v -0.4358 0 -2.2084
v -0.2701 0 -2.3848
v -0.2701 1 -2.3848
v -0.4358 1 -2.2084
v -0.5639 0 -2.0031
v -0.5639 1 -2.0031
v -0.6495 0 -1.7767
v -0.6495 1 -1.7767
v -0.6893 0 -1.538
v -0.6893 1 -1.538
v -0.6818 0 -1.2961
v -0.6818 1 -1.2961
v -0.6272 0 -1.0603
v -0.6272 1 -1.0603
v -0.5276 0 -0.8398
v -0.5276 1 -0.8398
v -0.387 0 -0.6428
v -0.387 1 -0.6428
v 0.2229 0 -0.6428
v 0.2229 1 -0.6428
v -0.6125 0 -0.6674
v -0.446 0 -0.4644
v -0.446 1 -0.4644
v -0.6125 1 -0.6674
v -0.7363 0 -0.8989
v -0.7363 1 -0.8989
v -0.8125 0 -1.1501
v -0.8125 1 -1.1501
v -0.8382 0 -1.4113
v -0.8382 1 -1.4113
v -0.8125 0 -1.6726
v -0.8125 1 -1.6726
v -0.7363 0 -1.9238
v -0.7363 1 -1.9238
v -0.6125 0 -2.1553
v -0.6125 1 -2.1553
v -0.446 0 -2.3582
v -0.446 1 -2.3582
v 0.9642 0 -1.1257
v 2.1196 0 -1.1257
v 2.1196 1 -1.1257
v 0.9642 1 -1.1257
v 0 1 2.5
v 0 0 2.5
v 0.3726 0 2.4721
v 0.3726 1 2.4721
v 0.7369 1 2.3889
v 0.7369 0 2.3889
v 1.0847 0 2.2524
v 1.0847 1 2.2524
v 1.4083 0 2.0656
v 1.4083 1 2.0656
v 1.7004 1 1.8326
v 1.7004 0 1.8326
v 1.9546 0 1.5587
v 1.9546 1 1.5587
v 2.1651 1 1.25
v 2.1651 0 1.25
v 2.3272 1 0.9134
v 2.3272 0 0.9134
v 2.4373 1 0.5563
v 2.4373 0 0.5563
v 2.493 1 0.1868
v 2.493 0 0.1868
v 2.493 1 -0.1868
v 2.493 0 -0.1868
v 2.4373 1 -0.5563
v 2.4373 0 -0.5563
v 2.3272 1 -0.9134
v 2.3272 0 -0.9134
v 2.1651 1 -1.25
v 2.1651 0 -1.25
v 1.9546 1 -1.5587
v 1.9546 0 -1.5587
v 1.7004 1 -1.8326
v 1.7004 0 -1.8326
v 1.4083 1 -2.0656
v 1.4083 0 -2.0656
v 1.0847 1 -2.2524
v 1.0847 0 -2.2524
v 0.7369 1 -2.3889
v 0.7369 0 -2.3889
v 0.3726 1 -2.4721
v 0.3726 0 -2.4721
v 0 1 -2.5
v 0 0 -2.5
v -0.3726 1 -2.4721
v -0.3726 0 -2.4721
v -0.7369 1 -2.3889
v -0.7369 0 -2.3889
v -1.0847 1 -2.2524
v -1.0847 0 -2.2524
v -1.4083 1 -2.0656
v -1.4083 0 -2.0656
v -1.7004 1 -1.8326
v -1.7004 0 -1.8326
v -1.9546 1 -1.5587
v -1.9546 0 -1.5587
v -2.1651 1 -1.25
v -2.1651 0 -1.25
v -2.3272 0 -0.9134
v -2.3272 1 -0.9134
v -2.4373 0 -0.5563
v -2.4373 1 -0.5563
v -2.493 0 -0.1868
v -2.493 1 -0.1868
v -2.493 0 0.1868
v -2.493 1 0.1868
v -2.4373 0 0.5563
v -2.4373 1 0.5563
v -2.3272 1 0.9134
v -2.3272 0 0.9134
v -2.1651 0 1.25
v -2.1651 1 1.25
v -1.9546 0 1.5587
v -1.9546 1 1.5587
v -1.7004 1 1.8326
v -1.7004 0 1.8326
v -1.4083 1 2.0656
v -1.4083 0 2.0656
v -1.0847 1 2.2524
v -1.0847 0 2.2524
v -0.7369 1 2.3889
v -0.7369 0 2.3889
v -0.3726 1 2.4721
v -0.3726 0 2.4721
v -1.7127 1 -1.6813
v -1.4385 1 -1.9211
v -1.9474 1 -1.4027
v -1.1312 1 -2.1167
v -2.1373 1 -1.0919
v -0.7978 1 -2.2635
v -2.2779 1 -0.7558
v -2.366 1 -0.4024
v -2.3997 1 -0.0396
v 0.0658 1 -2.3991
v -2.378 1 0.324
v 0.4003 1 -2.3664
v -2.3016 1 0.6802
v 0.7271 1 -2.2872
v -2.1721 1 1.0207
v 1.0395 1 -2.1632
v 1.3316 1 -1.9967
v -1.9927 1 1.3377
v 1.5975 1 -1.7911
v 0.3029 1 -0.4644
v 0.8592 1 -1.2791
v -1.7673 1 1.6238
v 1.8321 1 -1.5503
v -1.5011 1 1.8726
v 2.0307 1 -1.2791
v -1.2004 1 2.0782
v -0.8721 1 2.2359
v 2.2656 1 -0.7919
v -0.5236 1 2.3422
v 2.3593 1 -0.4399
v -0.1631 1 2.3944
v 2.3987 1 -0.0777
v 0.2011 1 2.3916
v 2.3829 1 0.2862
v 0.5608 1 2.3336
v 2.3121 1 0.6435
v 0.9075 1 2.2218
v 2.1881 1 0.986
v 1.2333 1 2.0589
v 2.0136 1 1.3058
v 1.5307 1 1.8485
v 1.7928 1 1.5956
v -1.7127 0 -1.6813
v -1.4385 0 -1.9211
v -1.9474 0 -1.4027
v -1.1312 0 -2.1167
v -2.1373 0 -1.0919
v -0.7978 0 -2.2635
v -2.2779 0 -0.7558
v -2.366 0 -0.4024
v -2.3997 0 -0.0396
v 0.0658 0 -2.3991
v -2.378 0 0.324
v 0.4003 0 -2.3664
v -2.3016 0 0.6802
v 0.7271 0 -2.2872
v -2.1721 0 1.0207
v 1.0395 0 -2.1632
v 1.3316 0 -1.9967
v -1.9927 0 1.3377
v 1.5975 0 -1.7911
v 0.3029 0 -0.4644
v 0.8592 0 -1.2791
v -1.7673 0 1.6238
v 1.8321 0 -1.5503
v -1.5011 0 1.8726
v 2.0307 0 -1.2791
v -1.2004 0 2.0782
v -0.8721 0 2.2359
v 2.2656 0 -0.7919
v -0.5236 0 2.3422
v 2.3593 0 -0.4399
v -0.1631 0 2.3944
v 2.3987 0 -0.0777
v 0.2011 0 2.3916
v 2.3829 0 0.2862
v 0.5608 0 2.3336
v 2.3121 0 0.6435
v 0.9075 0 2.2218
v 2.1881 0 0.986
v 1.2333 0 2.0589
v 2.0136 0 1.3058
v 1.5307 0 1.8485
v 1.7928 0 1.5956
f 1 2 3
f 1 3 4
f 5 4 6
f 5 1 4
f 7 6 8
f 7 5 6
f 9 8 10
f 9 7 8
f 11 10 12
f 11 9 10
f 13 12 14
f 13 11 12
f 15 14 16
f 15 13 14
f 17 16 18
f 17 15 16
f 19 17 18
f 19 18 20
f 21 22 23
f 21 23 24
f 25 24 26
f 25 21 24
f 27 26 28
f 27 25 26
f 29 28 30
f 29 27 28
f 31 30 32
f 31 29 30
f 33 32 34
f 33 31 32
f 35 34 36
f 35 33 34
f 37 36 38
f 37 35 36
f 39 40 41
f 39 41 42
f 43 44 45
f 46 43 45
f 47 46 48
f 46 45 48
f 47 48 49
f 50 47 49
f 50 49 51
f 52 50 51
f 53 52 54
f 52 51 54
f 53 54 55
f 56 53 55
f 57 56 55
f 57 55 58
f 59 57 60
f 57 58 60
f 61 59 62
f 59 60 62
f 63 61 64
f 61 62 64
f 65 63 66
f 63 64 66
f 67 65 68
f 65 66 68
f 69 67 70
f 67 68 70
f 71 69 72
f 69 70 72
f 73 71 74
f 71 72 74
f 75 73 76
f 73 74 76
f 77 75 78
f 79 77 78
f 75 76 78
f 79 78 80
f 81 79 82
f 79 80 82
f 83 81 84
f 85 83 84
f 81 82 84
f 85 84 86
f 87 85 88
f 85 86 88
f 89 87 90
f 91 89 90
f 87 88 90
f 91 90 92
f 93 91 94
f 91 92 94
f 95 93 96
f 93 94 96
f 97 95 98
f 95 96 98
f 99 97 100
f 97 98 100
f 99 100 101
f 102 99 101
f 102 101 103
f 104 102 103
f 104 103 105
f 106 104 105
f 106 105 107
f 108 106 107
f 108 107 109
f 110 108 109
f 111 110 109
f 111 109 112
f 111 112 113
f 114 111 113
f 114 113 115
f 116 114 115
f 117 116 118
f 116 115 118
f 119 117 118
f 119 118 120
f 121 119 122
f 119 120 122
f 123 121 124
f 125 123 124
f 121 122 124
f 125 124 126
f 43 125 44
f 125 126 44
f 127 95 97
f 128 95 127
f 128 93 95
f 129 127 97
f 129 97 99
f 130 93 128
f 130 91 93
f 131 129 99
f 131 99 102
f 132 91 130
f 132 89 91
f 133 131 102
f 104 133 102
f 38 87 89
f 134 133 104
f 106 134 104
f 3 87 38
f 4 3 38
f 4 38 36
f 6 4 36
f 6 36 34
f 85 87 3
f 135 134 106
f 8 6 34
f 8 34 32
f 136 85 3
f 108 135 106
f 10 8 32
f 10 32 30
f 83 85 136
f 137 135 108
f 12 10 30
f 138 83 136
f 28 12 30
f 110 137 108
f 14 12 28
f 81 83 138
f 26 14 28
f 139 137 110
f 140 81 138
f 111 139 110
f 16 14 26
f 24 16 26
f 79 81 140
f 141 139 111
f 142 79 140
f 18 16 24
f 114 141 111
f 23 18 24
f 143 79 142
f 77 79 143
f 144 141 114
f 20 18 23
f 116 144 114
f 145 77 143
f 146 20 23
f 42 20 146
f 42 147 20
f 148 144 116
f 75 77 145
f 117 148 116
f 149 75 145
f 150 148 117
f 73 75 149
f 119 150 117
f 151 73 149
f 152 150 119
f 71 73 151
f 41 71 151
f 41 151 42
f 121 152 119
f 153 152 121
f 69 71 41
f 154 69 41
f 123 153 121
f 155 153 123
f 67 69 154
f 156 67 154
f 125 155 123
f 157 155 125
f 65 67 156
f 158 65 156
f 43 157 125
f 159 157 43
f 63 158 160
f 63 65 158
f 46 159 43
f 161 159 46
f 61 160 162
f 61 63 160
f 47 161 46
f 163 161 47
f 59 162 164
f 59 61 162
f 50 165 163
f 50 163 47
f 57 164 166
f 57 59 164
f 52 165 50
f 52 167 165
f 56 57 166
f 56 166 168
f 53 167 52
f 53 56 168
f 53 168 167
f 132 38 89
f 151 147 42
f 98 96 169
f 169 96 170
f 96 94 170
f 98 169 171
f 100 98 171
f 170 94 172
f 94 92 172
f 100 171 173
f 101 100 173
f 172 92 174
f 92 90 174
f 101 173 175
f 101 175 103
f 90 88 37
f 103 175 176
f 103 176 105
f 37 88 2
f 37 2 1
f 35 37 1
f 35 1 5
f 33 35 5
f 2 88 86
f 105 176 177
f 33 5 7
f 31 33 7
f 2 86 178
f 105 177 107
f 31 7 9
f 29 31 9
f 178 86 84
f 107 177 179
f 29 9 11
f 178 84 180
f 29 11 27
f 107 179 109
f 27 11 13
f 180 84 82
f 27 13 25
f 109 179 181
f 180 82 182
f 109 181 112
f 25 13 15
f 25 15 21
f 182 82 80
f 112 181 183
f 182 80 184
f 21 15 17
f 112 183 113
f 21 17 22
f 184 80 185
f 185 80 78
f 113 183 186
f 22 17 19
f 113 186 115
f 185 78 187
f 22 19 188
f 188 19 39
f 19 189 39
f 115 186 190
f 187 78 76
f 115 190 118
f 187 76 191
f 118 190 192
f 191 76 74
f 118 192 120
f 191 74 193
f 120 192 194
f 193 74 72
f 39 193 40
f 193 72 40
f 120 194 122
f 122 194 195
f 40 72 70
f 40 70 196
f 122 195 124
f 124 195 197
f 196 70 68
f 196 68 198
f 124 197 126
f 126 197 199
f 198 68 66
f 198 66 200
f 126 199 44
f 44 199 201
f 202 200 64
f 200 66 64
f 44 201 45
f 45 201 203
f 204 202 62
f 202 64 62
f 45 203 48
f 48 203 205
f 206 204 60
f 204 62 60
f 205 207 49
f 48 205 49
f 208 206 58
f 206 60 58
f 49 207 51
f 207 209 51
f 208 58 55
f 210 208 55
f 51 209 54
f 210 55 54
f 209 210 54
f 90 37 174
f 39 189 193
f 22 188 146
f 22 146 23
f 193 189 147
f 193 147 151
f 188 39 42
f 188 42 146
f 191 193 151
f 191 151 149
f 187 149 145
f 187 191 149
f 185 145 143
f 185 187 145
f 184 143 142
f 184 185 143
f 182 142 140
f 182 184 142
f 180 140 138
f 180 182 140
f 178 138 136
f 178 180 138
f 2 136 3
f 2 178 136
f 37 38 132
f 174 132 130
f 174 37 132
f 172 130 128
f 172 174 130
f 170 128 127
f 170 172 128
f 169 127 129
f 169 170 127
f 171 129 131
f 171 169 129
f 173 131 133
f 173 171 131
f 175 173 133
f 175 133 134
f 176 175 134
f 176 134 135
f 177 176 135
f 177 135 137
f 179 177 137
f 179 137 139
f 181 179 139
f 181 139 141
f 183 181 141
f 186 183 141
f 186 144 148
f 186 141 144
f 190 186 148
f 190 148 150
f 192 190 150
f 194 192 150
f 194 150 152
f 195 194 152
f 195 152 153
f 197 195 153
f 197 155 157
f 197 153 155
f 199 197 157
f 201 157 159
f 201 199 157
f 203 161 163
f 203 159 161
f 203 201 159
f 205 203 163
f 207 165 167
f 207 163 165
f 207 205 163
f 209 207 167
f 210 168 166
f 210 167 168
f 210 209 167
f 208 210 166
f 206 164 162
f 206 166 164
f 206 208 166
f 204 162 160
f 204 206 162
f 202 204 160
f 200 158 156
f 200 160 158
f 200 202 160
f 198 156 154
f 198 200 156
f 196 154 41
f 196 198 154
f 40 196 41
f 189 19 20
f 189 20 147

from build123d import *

# Parameters (mm, degrees)
SKETCH1_R           = 2.5
SKETCH1_R_2         = 2.4
BOSS_EXTRUDE1_DEPTH = 1
BOSS_EXTRUDE2_DEPTH = 1


with BuildPart() as part:
    # Sketch1 → Boss-Extrude1 (new body)
    with BuildSketch(Plane(origin=(0, 0, 0), x_dir=(1, 0, 0), z_dir=(0, 1, 0))):
        with Locations(Location((0, 0, 0), (0, 0, 270))):
            Circle(SKETCH1_R)
        with Locations(Location((0, 0, 0), (0, 0, 270))):
            Circle(SKETCH1_R_2, mode=Mode.SUBTRACT)
    extrude(amount=BOSS_EXTRUDE1_DEPTH)

    # Sketch2 → Boss-Extrude2 (add)
    with BuildSketch(Plane(origin=(0, 0, 0), x_dir=(1, 0, 0), z_dir=(0, 1, 0))):
        with BuildLine():
            Line((2.119648162, 1.125651664), (0.964151756, 1.125651664))
            Line((0.964151756, 1.125651664), (0.302943091, 0.464443))
            Line((0.302943091, 0.464443), (-0.446002173, 0.464443))
            ThreePointArc((-0.446002173, 0.464443), (-0.838210984, 1.411318831), (-0.446002173, 2.358194662))
            ThreePointArc((-0.446002173, 2.358194662), (-0.358295432, 2.373104377), (-0.27009636, 2.384753228))
            ThreePointArc((-0.27009636, 2.384753228), (-0.689298485, 1.537997556), (-0.386972473, 0.642830213))
            Line((-0.386972473, 0.642830213), (0.22293871, 0.642830213))
            Line((0.22293871, 0.642830213), (0.859210068, 1.279101571))
            Line((0.859210068, 1.279101571), (2.030738577, 1.279101571))
            ThreePointArc((2.030738577, 1.279101571), (2.07661124, 1.203198138), (2.119648162, 1.125651664))
        make_face()
    extrude(amount=BOSS_EXTRUDE2_DEPTH)


solid = part.part
